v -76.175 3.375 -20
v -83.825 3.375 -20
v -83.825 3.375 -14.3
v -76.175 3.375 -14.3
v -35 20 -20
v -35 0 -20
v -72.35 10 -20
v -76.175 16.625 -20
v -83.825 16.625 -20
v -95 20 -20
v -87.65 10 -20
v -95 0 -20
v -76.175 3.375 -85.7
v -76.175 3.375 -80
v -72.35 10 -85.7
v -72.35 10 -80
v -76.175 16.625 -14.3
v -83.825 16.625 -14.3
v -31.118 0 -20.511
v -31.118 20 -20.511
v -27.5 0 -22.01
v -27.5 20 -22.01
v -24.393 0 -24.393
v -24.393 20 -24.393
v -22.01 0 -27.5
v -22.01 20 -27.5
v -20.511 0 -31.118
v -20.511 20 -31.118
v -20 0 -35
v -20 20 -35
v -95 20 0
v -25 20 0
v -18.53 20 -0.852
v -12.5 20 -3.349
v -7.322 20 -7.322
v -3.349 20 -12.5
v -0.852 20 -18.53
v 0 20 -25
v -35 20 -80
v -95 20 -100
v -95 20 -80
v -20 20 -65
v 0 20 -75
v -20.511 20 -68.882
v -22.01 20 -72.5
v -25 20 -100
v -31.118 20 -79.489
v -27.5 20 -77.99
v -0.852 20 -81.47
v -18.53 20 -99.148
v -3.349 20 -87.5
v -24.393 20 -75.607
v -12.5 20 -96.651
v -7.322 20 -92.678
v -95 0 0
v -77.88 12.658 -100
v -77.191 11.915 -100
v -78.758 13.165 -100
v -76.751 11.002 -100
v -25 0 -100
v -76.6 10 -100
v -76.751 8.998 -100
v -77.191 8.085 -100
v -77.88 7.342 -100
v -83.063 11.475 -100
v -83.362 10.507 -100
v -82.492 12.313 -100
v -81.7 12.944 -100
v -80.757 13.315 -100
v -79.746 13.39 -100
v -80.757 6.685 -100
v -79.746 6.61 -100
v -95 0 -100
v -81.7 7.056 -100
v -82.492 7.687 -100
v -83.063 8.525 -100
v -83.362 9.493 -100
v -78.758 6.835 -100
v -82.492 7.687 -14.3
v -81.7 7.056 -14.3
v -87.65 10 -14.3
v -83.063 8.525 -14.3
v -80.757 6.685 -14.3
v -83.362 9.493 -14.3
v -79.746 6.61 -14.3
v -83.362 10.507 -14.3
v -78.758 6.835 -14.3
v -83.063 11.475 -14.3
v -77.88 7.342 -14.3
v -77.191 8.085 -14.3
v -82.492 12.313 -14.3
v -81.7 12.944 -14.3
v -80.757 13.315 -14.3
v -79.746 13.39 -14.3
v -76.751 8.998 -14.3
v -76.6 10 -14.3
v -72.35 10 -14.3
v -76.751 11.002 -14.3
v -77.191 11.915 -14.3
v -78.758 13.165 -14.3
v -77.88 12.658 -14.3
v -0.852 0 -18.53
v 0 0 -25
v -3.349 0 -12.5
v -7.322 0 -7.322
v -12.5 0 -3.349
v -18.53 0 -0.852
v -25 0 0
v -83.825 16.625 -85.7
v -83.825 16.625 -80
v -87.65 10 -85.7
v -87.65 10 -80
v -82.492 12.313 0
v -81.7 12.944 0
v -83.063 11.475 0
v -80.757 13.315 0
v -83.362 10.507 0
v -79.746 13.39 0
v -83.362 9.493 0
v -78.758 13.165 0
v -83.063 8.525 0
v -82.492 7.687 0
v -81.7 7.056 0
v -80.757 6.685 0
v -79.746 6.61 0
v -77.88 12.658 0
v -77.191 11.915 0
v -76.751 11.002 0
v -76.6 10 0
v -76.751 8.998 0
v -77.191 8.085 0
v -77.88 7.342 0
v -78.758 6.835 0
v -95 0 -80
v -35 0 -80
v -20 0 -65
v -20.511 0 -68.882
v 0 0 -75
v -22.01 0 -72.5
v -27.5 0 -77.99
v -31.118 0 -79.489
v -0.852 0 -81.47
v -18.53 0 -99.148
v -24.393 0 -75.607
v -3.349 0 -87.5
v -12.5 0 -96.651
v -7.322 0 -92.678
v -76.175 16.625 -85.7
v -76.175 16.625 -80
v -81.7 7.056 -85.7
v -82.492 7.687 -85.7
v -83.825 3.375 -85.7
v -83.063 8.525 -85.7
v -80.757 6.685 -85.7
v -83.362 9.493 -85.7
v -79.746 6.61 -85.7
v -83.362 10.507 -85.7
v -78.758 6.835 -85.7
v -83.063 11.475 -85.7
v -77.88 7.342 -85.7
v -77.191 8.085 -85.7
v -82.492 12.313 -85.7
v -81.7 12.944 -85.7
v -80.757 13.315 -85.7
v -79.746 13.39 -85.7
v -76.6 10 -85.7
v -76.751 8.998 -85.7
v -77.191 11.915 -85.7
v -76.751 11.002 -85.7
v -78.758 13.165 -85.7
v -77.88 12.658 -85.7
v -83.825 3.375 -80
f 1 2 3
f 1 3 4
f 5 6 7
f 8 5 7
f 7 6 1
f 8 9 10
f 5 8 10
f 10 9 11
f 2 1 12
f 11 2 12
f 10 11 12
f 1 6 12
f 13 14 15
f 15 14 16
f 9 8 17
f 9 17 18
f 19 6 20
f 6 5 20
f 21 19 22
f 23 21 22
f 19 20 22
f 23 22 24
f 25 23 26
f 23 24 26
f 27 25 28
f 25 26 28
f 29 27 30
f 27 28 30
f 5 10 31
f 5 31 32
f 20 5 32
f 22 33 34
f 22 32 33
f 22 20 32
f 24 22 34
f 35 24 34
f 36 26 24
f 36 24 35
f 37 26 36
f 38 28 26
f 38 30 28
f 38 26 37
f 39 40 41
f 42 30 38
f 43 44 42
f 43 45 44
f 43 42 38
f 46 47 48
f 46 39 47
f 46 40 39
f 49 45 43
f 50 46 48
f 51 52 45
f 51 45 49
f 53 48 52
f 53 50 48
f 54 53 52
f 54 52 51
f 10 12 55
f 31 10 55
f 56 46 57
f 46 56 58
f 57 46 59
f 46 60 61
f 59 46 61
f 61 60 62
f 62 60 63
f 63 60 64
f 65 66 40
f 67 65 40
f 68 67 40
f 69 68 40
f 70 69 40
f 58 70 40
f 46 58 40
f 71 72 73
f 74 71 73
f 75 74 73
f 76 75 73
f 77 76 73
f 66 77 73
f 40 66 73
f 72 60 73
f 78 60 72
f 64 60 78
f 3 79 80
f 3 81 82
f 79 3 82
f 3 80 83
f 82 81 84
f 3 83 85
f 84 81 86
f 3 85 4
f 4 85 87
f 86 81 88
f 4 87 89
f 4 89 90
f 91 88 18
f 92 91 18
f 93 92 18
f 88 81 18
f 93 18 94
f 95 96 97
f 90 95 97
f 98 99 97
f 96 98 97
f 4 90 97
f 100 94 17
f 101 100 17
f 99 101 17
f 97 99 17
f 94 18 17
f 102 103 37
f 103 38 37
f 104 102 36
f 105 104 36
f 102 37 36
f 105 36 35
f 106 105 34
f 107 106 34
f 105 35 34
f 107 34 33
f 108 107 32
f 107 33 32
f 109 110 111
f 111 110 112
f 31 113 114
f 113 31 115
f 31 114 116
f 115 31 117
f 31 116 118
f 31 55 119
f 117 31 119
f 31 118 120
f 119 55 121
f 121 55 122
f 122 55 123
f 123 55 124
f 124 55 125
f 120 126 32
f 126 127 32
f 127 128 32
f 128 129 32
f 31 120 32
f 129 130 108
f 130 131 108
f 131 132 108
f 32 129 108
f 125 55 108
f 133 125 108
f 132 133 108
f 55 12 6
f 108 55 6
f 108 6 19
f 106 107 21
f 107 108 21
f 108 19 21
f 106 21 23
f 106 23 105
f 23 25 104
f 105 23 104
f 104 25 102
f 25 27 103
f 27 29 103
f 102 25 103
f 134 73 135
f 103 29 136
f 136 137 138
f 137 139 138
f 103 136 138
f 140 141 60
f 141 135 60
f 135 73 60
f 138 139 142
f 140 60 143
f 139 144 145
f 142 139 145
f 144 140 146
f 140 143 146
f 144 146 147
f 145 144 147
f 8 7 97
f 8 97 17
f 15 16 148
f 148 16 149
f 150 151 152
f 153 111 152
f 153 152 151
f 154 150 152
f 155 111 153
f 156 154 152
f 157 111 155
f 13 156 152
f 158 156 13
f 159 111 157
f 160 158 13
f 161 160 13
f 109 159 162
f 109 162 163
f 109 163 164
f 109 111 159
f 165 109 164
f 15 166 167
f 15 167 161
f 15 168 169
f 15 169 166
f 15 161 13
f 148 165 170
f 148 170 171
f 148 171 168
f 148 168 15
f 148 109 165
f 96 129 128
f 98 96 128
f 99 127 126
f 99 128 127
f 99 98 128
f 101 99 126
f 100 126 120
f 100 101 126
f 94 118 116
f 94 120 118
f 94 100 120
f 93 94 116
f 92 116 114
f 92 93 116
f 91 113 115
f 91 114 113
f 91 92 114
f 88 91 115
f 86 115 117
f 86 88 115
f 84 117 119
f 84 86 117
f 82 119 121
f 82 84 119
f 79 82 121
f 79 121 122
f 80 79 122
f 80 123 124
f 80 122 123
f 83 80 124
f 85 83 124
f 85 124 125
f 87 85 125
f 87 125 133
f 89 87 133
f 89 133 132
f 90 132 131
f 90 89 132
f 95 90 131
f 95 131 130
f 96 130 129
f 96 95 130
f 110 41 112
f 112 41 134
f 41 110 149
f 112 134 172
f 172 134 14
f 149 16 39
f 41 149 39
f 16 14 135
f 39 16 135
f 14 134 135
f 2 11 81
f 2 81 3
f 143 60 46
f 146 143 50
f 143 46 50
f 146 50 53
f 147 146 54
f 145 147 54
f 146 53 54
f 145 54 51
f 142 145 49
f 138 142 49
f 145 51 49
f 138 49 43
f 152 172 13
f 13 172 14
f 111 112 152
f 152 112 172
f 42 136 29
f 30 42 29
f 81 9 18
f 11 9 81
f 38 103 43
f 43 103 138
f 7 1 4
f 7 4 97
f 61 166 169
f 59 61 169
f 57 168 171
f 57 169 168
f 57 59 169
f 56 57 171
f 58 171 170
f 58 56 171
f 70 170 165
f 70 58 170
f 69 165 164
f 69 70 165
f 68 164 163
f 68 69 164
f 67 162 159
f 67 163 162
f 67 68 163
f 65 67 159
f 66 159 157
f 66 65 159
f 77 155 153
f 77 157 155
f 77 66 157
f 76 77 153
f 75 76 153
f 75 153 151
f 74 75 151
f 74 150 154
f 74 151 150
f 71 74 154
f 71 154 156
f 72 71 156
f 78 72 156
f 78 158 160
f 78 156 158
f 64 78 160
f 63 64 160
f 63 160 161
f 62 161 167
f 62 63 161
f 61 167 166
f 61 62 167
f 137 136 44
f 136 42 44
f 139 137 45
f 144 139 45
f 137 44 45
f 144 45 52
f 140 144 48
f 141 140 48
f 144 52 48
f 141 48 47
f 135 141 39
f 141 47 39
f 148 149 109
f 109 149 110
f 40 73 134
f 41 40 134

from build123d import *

# Parameters (mm, degrees)
BOSS_EXTRUDE1_DEPTH     = 20
CUT_EXTRUDE1_DEPTH      = 126.797456254
CUT_EXTRUDE1_DEPTH_BACK = 126.797456254
SKETCH3_R               = 3.4
CUT_EXTRUDE2_DEPTH      = 5.7
CUT_EXTRUDE3_START      = 60
CUT_EXTRUDE3_DEPTH      = 5.7
FILLET1_R               = 15
FILLET2_R               = 25


with BuildPart() as part:
    # Sketch2 → Boss-Extrude1 (new body)
    with BuildSketch(Plane(origin=(0, 0, 0), x_dir=(1, 0, 0), z_dir=(0, 1, 0))):
        Polygon((-95, 20), (-95, 0), (0, 0), (0, 100), (-95, 100), (-95, 80), (-20, 80), (-20, 20), align=None)
    extrude(amount=BOSS_EXTRUDE1_DEPTH)

    # Sketch3 → Cut-Extrude1 (cut, two sides: drawn at the far end of the back side and taken through both)
    with BuildSketch(Plane.XY.offset(-80).offset(-CUT_EXTRUDE1_DEPTH_BACK)):
        with Locations((-80, 10)):
            Circle(SKETCH3_R)
    extrude(amount=CUT_EXTRUDE1_DEPTH + CUT_EXTRUDE1_DEPTH_BACK, mode=Mode.SUBTRACT)

    # Sketch4 → Cut-Extrude2 (cut)
    with BuildSketch(Plane.XY.offset(-80)):
        Polygon((-76.175, 3.374905661), (-72.35, 10), (-76.175, 16.625094339), (-83.825, 16.625094339), (-87.65, 10), (-83.825, 3.374905661), align=None)
    extrude(amount=-CUT_EXTRUDE2_DEPTH, mode=Mode.SUBTRACT)

    # Sketch4<2> → Cut-Extrude3 (cut)
    with BuildSketch(Plane.XY.offset(-80).offset(CUT_EXTRUDE3_START)):
        Polygon((-76.175, 3.374905661), (-72.35, 10), (-76.175, 16.625094339), (-83.825, 16.625094339), (-87.65, 10), (-83.825, 3.374905661), align=None)
    extrude(amount=CUT_EXTRUDE3_DEPTH, mode=Mode.SUBTRACT)

    # Fillet1
    fillet1_edges = [part.edges().sort_by_distance(p)[0] for p in [
        (-20, 10, -20),
        (-20, 10, -80),
    ]]
    fillet(fillet1_edges, radius=FILLET1_R)

    # Fillet2
    fillet2_edges = [part.edges().sort_by_distance(p)[0] for p in [
        (0, 10, -100),
        (0, 10, 0),
    ]]
    fillet(fillet2_edges, radius=FILLET2_R)


solid = part.part
